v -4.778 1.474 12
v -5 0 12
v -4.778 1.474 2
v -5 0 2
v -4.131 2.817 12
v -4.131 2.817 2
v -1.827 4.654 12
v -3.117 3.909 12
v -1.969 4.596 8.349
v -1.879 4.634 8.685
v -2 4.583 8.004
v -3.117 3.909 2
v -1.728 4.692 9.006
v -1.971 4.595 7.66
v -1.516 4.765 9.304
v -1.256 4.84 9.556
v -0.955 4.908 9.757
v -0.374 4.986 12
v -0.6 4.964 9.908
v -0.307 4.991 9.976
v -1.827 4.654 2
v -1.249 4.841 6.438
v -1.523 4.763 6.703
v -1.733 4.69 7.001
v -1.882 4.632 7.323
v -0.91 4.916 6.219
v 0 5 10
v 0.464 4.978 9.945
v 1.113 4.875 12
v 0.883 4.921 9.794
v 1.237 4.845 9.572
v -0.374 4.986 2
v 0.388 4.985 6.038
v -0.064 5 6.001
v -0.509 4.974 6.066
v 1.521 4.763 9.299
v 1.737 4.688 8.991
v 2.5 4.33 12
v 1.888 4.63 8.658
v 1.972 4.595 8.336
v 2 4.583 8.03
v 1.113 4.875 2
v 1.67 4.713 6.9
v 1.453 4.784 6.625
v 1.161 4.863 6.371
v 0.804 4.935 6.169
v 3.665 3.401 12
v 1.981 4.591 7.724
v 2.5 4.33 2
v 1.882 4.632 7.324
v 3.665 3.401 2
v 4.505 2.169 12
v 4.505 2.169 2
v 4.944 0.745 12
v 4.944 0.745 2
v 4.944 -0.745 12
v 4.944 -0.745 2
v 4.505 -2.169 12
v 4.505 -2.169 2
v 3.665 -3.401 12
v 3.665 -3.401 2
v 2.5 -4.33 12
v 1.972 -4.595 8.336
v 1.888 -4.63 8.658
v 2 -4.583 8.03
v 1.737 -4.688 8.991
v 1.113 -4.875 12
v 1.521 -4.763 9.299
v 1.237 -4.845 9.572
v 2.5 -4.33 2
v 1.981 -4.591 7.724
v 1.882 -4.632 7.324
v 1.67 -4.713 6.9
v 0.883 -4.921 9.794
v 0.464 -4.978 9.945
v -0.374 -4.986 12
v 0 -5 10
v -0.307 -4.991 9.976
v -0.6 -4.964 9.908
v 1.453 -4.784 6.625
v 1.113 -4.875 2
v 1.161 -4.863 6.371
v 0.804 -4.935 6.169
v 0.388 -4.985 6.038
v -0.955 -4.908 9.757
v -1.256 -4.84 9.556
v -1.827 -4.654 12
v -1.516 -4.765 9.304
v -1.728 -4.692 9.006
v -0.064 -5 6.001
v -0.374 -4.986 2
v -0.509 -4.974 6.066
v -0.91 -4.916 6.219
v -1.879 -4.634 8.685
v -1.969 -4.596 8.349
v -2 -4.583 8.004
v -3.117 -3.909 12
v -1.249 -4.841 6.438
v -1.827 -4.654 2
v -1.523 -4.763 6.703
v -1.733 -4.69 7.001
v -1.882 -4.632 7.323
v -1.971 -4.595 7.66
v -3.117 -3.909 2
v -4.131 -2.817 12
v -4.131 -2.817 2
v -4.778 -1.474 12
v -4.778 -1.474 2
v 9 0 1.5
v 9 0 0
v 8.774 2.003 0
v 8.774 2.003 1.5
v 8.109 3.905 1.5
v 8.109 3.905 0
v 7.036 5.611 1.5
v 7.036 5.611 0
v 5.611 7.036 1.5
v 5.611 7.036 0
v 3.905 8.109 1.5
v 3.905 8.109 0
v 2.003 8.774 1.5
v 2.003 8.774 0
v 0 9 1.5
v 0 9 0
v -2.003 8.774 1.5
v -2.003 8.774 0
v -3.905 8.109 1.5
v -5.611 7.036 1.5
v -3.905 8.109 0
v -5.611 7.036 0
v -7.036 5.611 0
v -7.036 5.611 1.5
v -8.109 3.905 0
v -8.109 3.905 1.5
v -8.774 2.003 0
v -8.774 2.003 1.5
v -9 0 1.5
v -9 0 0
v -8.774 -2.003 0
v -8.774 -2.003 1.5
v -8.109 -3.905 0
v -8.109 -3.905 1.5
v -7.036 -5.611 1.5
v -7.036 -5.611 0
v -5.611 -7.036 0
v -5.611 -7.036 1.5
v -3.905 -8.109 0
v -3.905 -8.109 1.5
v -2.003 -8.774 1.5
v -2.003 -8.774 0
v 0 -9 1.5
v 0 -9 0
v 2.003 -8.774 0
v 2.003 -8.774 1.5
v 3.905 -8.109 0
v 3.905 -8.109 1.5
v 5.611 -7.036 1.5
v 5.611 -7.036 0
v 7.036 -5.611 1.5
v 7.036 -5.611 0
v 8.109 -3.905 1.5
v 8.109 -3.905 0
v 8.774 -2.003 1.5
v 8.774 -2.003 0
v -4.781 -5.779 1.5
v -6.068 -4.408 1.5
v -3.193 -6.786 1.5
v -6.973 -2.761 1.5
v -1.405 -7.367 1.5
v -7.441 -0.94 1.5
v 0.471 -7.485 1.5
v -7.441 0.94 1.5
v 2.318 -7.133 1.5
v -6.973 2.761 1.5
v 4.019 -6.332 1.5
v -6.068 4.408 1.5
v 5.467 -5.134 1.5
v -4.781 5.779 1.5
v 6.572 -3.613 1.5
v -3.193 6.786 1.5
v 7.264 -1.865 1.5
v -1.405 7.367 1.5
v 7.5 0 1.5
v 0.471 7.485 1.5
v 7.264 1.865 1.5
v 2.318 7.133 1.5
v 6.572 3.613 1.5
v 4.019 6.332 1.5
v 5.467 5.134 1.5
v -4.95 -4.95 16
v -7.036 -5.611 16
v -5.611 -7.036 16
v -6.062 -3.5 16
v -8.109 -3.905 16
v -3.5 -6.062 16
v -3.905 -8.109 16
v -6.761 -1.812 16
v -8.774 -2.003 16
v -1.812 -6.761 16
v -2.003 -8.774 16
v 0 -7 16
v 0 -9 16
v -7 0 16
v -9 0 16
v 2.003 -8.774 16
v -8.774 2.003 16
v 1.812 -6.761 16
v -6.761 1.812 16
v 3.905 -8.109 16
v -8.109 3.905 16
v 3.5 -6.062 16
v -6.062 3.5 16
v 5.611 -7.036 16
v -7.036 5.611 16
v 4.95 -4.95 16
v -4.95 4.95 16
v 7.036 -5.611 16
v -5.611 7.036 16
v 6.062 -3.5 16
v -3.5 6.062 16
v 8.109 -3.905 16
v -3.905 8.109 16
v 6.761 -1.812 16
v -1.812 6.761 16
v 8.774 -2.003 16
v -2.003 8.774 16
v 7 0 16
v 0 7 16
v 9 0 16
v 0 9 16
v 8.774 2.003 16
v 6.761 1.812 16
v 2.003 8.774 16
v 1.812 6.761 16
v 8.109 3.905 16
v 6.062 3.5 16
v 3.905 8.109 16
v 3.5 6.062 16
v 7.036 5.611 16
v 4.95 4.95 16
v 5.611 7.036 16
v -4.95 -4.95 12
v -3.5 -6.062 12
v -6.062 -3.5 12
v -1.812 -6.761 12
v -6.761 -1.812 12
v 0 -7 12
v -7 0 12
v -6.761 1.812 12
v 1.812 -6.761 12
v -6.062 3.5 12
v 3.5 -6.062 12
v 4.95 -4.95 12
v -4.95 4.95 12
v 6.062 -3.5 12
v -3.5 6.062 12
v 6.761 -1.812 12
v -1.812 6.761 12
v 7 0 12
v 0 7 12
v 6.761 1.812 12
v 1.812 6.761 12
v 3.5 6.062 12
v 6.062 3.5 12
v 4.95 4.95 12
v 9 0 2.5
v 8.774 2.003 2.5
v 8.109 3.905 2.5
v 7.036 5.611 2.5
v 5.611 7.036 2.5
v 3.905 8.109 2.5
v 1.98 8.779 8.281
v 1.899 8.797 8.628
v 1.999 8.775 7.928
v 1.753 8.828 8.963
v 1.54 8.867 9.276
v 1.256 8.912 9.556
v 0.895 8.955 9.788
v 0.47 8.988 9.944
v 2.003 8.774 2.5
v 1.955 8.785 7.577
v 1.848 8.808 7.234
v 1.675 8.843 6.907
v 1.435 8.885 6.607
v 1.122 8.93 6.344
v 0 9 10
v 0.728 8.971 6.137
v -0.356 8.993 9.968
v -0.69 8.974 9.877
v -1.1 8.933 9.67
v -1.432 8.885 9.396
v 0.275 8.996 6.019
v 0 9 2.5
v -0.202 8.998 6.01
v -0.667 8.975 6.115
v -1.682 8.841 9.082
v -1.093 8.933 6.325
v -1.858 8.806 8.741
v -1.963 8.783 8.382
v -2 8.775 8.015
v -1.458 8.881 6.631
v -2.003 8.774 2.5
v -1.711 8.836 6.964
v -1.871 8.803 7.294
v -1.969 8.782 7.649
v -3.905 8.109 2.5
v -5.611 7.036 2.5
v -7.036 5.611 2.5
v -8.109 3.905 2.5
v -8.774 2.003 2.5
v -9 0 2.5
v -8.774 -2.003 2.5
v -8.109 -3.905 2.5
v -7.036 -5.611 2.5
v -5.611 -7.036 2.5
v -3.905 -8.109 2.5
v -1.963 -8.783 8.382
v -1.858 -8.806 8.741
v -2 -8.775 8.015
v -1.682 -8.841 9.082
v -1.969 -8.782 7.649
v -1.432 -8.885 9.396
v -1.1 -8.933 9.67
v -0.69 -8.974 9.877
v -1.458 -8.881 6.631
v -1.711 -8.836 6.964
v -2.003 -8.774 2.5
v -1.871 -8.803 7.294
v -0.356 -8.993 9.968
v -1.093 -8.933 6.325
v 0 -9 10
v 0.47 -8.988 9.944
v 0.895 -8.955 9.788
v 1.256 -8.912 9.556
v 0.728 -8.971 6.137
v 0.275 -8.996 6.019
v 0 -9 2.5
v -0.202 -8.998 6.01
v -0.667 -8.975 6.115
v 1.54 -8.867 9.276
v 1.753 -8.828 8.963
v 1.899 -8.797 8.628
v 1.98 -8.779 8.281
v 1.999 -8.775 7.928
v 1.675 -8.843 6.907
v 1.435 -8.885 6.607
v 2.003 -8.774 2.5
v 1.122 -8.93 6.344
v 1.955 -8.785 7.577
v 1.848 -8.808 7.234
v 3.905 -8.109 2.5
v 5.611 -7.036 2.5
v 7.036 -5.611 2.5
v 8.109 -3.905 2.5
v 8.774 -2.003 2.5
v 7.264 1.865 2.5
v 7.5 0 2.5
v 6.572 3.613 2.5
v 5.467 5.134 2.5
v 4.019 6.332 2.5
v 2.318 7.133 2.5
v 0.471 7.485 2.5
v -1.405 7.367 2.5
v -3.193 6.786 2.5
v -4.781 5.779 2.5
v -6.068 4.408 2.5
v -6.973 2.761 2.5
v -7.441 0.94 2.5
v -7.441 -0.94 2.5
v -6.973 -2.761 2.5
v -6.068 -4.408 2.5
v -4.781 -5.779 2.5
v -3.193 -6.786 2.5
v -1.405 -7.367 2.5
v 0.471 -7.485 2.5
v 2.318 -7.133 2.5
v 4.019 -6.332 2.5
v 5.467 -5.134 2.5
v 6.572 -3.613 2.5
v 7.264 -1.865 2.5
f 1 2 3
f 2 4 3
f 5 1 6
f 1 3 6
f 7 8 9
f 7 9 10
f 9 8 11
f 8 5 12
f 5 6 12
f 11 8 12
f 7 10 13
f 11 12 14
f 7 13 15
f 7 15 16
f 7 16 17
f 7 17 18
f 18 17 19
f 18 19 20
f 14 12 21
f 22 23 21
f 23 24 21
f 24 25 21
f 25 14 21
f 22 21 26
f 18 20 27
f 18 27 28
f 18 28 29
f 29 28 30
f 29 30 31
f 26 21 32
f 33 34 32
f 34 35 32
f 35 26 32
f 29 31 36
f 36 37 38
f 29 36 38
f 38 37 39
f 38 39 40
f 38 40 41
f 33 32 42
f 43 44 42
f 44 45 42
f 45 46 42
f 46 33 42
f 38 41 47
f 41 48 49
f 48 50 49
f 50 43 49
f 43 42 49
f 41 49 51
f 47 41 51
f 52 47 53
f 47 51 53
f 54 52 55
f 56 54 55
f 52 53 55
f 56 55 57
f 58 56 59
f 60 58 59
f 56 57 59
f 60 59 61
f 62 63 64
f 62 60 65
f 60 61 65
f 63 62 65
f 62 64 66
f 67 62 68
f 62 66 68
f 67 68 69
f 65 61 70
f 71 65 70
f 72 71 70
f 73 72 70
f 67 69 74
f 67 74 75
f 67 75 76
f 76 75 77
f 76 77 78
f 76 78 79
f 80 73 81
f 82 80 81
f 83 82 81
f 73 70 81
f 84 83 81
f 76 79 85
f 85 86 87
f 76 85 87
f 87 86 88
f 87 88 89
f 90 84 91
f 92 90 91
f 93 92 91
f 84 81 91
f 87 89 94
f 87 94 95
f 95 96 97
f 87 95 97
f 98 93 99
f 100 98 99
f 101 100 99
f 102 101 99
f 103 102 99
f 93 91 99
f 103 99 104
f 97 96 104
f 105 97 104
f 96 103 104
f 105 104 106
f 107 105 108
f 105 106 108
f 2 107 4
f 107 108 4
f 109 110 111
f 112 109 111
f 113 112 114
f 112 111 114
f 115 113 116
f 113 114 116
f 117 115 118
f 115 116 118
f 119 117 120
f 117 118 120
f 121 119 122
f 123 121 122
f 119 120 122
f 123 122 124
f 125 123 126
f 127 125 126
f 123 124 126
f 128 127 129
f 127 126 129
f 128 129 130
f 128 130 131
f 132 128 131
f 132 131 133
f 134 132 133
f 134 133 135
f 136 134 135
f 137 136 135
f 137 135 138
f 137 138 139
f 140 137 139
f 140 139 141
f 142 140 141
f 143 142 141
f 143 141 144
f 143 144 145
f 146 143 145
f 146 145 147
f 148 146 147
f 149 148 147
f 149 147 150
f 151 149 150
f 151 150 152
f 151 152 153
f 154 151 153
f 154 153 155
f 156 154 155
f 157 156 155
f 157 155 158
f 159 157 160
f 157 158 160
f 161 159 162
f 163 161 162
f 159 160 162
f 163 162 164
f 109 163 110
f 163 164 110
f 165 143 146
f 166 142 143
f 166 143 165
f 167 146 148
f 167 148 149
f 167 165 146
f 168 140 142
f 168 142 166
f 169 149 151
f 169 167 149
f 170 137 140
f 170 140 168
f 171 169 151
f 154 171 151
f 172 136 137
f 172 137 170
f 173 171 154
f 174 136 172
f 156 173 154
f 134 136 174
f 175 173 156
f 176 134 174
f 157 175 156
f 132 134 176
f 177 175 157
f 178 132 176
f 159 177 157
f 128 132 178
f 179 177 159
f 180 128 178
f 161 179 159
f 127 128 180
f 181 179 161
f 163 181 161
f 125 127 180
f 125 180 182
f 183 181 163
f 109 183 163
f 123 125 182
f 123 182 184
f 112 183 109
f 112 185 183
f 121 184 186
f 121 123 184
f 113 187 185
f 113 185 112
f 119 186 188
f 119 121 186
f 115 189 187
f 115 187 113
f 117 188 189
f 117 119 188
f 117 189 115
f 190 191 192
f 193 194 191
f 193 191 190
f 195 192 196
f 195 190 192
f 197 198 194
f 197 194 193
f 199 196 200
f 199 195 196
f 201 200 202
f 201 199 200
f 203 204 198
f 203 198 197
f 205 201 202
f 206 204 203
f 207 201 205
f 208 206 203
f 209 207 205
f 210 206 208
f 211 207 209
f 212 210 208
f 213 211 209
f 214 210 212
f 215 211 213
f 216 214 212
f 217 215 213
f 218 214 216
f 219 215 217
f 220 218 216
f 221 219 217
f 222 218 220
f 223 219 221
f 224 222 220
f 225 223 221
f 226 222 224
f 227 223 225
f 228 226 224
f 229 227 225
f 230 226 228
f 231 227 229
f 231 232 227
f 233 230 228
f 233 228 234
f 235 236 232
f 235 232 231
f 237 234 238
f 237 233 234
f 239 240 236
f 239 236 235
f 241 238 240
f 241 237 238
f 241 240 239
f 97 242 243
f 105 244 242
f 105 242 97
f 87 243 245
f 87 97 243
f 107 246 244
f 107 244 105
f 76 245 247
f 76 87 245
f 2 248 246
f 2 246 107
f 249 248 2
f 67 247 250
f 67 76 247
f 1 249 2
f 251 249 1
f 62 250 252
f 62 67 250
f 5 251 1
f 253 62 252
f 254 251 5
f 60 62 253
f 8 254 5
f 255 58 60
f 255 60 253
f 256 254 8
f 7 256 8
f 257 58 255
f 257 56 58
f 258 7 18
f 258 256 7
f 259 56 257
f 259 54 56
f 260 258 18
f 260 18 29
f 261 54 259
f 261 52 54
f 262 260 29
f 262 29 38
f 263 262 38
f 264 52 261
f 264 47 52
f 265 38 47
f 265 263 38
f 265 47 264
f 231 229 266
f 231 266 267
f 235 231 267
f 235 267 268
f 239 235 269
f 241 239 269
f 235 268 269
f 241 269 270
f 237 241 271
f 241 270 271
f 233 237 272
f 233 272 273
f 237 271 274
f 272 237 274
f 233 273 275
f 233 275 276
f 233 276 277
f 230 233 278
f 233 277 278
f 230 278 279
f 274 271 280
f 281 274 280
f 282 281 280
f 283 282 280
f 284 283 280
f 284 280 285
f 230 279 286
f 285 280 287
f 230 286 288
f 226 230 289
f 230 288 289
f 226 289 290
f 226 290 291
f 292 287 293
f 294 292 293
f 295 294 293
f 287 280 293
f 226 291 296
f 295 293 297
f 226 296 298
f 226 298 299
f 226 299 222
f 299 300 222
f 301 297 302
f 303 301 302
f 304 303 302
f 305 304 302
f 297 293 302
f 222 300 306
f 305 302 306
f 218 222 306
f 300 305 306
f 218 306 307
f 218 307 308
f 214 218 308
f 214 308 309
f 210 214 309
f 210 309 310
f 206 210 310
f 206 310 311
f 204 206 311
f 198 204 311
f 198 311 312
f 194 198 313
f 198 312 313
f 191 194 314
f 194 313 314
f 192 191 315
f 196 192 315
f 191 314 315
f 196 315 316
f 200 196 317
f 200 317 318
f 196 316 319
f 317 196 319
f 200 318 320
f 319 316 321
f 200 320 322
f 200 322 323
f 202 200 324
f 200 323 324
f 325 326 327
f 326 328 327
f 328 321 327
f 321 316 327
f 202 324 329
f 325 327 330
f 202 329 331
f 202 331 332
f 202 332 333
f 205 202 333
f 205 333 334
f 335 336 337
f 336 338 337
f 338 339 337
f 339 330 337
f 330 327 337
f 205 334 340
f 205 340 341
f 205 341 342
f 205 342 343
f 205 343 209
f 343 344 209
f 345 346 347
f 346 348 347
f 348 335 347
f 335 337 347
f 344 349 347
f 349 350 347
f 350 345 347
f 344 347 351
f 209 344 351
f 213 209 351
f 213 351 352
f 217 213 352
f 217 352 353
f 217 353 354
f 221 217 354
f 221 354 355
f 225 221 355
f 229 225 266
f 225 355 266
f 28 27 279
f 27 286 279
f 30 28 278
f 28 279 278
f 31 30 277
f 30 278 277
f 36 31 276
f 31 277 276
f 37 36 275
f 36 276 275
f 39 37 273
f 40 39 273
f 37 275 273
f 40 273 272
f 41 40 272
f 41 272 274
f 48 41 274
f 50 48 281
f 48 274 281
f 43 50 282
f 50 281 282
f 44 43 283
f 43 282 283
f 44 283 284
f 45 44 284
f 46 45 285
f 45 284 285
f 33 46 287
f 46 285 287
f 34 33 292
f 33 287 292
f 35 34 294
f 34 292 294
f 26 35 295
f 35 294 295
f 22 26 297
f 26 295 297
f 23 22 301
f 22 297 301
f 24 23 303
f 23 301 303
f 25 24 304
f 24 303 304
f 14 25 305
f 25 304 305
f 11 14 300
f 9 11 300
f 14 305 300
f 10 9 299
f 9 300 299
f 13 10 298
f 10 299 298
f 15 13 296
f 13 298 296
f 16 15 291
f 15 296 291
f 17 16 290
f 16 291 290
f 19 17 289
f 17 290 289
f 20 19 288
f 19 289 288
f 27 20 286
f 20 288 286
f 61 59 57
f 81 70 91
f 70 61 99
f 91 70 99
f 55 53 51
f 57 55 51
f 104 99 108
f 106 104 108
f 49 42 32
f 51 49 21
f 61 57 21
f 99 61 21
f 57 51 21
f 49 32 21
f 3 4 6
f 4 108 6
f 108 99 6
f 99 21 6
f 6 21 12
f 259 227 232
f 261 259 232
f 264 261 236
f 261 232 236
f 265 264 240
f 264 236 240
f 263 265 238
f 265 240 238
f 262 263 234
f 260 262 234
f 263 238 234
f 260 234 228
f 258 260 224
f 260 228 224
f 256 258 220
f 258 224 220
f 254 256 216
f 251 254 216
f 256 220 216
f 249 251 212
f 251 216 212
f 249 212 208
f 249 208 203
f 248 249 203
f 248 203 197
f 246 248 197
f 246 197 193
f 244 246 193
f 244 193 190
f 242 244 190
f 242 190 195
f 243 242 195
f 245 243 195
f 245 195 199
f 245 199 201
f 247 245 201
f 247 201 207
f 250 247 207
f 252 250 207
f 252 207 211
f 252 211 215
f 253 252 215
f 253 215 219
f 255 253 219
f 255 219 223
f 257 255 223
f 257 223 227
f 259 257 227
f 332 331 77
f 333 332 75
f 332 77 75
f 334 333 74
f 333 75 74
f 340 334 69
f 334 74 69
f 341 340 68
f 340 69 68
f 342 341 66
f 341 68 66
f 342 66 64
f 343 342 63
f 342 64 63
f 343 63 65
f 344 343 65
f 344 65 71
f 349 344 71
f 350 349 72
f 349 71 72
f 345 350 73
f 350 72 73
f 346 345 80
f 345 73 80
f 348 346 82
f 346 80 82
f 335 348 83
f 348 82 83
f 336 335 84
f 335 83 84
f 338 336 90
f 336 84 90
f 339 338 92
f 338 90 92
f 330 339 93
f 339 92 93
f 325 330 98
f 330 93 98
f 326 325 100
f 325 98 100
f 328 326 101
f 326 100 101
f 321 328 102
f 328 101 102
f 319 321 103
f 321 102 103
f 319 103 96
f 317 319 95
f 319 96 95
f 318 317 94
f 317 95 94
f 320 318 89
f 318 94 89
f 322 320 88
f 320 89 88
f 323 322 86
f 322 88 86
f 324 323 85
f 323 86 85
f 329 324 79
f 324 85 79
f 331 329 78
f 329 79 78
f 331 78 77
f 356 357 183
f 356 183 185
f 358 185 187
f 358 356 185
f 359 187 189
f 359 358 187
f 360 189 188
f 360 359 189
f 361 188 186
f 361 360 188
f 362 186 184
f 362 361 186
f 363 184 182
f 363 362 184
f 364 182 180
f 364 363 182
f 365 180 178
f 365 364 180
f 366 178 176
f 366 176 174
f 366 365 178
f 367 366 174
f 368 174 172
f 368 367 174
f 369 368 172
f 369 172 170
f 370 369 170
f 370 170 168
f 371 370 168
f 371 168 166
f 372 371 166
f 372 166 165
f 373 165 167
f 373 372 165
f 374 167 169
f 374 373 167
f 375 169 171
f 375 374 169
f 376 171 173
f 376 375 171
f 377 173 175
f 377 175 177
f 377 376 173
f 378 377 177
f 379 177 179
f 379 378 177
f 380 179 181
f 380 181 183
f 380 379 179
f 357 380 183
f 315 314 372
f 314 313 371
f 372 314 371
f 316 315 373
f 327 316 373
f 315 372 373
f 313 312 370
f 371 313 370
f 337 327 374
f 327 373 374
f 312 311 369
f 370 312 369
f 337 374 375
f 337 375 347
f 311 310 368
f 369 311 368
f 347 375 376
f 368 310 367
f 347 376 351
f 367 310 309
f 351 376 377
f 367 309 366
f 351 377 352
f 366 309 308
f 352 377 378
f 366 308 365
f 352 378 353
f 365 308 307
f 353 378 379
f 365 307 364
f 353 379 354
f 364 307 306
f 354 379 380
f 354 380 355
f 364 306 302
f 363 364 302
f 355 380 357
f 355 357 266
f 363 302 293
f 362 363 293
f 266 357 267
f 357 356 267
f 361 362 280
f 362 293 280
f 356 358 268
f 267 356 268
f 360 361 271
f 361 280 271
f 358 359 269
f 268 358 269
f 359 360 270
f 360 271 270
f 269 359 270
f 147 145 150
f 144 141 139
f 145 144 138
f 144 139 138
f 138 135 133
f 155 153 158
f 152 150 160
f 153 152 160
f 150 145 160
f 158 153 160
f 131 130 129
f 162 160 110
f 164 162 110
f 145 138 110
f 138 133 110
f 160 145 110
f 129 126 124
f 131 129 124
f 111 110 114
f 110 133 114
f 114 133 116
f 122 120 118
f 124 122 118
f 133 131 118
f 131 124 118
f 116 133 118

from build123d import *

# Parameters (mm, degrees)
SKETCH1_R                                = 9
BOSS_EXTRUDE1_DEPTH                      = 16
CBORE_FOR_M14_HEX_HEAD_BOLT1_D           = 10
CBORE_FOR_M14_HEX_HEAD_BOLT1_DEPTH       = 14
CBORE_FOR_M14_HEX_HEAD_BOLT1_CBORE_D     = 14
CBORE_FOR_M14_HEX_HEAD_BOLT1_CBORE_DEPTH = 4
SKETCH4_R                                = 9
SKETCH4_R_2                              = 7.5
CUT_EXTRUDE1_DEPTH                       = 1
SKETCH5_R                                = 2
CUT_EXTRUDE2_DEPTH                       = 15.5


with BuildPart() as part:
    # Sketch1 → Boss-Extrude1 (new body)
    with BuildSketch(Plane.XY):
        Circle(SKETCH1_R)
    extrude(amount=BOSS_EXTRUDE1_DEPTH)

    # CBORE for M14 Hex Head Bolt1
    with Locations(Plane.XY.offset(16)):
        with Locations((0, 0)):
            CounterBoreHole(CBORE_FOR_M14_HEX_HEAD_BOLT1_D / 2, CBORE_FOR_M14_HEX_HEAD_BOLT1_CBORE_D / 2, CBORE_FOR_M14_HEX_HEAD_BOLT1_CBORE_DEPTH, depth=CBORE_FOR_M14_HEX_HEAD_BOLT1_DEPTH)

    # Sketch4 → Cut-Extrude1 (cut)
    with BuildSketch(Plane.XY.offset(2.5)):
        Circle(SKETCH4_R)
        Circle(SKETCH4_R_2, mode=Mode.SUBTRACT)
    extrude(amount=-CUT_EXTRUDE1_DEPTH, mode=Mode.SUBTRACT)

    # Sketch5 → Cut-Extrude2 (cut, symmetric)
    with BuildSketch(Plane(origin=(0, 0, 0), x_dir=(1, 0, 0), z_dir=(0, 1, 0))):
        with Locations(Location((0, -8, 0), (0, 0, 270))):  # turned: the seam where the file's is
            Circle(SKETCH5_R)
    extrude(amount=CUT_EXTRUDE2_DEPTH, both=True, mode=Mode.SUBTRACT)


solid = part.part
